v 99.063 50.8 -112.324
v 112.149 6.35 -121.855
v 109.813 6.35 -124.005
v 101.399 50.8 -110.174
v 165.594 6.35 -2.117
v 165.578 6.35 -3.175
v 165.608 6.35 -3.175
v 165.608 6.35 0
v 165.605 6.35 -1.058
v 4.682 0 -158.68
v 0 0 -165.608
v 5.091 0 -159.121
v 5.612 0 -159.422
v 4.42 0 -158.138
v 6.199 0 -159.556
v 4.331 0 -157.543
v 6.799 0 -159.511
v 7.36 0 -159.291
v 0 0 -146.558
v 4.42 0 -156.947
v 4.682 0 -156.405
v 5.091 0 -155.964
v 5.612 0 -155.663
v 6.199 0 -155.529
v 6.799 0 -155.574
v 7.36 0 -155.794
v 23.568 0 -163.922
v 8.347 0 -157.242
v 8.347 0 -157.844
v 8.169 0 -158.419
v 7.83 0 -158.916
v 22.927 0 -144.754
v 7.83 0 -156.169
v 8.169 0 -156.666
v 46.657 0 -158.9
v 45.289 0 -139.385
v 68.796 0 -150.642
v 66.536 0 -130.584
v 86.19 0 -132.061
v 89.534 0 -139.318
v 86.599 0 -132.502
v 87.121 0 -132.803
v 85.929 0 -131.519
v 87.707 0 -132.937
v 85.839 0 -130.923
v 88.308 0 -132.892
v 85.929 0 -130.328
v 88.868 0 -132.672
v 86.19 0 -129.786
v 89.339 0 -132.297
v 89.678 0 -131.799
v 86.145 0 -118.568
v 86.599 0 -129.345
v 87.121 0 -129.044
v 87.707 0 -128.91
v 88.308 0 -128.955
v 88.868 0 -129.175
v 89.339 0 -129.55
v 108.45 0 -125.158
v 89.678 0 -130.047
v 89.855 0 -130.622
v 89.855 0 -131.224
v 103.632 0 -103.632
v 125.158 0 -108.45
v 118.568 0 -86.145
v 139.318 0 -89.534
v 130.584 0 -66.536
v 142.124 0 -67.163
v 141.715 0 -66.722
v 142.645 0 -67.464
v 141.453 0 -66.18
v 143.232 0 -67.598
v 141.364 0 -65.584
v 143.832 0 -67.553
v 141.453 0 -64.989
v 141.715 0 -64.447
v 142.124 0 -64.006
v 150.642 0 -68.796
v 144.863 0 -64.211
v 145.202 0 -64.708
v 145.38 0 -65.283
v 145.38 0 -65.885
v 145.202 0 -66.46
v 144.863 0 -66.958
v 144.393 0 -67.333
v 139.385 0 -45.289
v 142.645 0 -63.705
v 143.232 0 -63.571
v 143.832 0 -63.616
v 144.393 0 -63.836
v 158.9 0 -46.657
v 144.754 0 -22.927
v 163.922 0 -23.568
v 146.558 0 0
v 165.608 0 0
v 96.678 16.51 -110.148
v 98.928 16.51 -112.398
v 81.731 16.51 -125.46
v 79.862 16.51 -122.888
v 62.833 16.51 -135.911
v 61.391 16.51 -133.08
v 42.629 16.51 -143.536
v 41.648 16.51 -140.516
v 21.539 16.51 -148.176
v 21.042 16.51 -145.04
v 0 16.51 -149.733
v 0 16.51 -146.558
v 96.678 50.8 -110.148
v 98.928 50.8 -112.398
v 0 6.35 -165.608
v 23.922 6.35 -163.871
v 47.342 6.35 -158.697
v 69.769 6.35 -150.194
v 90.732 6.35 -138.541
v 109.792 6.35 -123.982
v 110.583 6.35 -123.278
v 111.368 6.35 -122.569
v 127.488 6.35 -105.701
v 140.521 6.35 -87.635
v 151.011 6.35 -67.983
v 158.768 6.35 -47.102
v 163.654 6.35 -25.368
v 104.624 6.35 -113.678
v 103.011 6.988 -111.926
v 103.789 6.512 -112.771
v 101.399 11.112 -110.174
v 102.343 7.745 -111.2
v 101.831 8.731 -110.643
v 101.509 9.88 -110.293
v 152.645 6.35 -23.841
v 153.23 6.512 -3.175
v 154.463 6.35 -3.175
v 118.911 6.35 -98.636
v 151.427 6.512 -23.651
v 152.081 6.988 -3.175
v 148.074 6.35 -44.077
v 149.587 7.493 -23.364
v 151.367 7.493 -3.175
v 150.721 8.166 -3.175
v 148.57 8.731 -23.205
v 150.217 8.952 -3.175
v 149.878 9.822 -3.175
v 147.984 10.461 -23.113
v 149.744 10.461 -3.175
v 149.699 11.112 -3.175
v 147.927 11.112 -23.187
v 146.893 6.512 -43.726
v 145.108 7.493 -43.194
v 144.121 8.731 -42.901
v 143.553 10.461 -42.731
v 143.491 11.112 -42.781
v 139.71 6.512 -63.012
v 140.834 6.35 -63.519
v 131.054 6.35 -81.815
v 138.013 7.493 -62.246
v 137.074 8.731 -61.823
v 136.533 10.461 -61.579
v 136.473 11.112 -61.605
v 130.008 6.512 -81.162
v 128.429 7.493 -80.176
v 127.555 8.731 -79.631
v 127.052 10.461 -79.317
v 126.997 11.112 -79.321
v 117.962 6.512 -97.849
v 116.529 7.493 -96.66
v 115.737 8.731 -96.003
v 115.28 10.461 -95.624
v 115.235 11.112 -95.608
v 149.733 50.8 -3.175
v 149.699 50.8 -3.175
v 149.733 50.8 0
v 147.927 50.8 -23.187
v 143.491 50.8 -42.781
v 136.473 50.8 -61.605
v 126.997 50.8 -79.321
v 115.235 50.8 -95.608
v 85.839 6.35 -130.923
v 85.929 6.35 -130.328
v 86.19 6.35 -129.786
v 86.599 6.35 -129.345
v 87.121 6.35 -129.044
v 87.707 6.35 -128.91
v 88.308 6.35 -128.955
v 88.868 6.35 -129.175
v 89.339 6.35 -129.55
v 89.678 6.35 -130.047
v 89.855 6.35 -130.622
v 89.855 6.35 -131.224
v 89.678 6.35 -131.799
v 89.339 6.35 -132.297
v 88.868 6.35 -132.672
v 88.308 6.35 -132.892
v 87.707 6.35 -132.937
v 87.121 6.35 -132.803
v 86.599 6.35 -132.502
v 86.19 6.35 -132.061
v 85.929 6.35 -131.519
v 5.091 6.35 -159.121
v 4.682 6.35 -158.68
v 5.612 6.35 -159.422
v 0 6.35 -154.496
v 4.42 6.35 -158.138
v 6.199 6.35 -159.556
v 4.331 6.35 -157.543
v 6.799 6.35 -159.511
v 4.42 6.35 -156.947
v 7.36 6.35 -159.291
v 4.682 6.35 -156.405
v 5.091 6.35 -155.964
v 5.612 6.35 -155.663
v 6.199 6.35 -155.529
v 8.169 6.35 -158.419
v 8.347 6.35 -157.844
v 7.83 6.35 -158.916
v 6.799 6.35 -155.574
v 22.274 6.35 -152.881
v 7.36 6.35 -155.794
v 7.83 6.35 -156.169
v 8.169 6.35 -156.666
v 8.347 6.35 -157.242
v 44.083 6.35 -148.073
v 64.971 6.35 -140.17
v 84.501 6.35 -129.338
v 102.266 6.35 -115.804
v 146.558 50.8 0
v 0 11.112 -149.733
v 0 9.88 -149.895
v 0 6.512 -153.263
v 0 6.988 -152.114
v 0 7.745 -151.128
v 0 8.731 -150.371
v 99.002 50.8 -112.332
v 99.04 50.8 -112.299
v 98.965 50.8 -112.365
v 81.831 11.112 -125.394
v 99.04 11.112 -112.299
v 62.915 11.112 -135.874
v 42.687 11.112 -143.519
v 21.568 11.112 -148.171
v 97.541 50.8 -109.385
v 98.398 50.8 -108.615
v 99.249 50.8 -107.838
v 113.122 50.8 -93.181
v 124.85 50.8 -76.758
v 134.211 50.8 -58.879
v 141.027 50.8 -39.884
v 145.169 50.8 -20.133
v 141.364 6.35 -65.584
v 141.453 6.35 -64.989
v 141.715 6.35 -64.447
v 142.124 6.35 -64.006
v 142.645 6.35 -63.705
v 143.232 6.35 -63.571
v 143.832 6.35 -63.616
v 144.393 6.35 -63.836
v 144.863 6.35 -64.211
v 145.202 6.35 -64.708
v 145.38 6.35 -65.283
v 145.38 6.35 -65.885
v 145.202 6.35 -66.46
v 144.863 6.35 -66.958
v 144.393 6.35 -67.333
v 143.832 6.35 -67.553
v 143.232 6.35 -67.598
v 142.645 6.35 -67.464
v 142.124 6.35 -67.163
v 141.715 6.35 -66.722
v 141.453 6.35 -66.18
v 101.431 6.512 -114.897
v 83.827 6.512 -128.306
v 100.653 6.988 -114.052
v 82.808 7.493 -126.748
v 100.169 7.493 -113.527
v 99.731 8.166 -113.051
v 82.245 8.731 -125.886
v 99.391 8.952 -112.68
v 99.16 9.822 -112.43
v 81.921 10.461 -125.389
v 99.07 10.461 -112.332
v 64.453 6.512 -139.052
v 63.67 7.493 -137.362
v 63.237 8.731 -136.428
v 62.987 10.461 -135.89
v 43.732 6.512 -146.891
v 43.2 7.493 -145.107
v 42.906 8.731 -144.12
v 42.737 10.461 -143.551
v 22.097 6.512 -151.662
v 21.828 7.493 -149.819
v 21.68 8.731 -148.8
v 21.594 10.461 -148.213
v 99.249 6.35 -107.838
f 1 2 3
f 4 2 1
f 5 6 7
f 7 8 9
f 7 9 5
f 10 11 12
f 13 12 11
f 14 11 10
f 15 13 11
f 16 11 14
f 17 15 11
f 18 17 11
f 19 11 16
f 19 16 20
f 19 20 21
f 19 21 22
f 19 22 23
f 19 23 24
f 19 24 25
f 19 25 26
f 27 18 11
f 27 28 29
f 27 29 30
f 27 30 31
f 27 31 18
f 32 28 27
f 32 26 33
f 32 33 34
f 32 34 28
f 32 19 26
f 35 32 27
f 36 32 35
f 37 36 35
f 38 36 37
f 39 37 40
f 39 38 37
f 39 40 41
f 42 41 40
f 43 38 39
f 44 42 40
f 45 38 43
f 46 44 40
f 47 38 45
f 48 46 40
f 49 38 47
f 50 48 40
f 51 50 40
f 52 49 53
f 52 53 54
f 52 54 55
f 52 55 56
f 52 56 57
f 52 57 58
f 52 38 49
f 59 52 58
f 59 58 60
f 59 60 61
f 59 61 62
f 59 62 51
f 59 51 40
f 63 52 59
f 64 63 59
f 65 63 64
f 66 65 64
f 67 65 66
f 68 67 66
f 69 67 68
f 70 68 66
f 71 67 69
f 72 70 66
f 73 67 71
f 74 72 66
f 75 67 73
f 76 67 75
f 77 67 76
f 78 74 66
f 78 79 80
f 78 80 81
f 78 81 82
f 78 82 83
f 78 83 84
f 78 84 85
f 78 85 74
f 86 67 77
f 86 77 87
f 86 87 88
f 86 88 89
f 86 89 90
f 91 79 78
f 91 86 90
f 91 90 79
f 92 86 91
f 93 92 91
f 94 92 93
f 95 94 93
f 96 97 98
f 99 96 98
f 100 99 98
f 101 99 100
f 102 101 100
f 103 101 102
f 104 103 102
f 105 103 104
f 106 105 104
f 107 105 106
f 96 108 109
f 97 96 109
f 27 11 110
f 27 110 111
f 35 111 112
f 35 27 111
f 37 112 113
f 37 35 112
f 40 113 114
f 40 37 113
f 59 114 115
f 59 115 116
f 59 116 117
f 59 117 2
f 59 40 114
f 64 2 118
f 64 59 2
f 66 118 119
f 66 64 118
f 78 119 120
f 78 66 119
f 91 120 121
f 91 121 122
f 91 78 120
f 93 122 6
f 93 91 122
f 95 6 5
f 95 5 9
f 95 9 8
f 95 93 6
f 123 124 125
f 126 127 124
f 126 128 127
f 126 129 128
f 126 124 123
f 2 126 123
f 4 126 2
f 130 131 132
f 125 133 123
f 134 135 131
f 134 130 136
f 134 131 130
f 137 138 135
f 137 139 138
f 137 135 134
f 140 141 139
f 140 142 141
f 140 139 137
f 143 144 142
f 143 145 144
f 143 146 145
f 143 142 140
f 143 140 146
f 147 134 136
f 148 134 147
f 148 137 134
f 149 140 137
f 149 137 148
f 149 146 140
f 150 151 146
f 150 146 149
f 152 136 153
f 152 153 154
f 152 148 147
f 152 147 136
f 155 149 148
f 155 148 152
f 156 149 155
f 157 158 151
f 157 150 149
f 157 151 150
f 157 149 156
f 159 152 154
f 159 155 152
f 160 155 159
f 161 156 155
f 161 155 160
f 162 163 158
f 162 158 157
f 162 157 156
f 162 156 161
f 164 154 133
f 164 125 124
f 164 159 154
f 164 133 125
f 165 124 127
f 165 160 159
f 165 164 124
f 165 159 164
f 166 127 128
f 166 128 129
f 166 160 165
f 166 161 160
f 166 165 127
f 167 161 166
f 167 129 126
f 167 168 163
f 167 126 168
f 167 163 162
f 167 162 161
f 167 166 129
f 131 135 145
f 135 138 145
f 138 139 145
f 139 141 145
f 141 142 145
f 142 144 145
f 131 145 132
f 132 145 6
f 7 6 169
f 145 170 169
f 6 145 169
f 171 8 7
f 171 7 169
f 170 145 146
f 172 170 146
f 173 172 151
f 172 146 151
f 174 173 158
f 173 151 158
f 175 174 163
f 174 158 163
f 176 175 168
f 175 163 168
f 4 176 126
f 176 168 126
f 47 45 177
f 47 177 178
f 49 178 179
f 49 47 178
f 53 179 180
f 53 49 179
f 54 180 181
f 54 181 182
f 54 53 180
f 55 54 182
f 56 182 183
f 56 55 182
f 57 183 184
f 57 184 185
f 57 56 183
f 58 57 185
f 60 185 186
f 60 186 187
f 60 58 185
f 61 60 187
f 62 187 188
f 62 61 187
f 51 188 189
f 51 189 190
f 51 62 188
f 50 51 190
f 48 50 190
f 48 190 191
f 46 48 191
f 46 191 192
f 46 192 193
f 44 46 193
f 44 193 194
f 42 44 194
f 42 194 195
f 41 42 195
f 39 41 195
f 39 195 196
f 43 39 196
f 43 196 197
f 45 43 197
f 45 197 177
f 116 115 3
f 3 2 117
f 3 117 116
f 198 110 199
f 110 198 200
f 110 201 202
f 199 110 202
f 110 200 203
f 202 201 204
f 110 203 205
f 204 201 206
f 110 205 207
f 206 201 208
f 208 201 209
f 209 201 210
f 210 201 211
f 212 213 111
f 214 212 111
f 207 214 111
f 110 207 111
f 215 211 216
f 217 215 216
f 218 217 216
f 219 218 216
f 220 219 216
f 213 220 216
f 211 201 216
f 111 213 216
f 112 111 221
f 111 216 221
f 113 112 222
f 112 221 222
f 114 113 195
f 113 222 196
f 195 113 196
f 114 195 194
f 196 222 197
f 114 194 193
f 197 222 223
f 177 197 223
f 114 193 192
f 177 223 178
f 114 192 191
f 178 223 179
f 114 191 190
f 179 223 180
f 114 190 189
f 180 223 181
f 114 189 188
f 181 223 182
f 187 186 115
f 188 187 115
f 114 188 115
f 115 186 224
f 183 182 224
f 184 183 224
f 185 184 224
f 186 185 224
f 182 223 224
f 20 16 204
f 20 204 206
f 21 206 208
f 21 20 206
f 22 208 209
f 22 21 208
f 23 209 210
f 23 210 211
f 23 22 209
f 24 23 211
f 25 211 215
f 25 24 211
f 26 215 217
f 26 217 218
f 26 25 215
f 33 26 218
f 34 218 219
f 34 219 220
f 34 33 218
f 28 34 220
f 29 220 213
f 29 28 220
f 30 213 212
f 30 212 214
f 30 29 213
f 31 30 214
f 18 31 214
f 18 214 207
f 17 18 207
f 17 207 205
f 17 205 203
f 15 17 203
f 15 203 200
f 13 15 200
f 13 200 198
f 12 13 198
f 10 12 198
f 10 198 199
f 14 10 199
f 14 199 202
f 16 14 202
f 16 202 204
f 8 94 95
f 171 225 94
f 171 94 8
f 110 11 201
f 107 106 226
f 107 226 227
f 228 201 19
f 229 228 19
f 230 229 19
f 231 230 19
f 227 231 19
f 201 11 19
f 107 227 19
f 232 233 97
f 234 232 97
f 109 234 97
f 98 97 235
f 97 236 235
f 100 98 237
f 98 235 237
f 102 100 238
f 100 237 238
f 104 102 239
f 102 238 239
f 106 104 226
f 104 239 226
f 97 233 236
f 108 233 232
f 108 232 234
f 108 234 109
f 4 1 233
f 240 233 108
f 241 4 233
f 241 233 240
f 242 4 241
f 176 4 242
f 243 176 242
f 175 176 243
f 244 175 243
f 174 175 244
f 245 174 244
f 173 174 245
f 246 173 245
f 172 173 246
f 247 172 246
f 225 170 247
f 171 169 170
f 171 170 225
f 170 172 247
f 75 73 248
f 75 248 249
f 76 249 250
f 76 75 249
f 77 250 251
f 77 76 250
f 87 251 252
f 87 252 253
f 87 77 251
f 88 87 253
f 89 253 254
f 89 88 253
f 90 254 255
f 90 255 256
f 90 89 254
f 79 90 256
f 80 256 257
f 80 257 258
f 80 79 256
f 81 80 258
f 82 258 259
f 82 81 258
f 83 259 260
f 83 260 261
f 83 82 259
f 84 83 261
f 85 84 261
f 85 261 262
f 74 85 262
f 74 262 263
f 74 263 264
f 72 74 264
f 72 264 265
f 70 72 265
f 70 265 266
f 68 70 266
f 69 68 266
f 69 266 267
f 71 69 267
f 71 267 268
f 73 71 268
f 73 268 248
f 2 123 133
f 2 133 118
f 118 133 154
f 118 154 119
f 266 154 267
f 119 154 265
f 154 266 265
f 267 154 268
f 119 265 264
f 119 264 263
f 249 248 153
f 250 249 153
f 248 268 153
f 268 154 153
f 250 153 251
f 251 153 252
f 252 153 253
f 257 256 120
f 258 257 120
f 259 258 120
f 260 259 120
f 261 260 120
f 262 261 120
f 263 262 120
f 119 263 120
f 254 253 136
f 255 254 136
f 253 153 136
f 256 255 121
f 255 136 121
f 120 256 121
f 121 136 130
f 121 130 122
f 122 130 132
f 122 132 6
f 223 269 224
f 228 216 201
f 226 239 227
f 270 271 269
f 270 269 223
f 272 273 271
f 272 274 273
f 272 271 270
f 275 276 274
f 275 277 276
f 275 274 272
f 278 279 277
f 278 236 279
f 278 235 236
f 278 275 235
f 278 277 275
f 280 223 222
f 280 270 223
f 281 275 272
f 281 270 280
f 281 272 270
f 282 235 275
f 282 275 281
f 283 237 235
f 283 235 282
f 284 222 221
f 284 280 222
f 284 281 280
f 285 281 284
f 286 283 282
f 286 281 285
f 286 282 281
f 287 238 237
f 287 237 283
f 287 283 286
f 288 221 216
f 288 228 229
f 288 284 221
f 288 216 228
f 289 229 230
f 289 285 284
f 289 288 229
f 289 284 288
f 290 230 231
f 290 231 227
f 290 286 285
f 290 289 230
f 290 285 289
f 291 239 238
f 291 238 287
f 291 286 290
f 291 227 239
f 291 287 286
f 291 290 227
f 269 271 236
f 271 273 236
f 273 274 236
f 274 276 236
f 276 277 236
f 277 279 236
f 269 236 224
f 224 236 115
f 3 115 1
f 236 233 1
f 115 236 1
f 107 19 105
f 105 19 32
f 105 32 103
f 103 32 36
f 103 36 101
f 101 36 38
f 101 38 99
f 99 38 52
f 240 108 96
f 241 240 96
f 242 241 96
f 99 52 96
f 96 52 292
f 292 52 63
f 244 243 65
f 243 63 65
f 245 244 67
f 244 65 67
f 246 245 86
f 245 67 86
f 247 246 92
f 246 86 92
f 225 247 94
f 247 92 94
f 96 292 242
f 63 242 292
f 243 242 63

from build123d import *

# Parameters (mm, degrees)
BOSS_EXTRUDE1_DEPTH        = 6.35
BOSS_EXTRUDE2_DEPTH        = 44.45
CUT_EXTRUDE1_DEPTH         = 34.29
F_10_32_TAPPED_HOLE1_D     = 4.0386
F_10_32_TAPPED_HOLE1_DEPTH = 6.35
BOSS_EXTRUDE3_DEPTH        = 3.175
CIRPATTERN1_COUNT          = 2
CIRPATTERN1_ANGLE          = 47.375
FILLET1_R                  = 4.7625


with BuildPart() as part:
    # Sketch1 → Boss-Extrude1 (new body)
    with BuildSketch(Plane(origin=(0, 0, 0), x_dir=(1, 0, 0), z_dir=(0, 1, 0))):
        with BuildLine():
            Line((165.608, 0), (146.558, 0))
            ThreePointArc((146.558, 0), (103.632155637, -103.632155637), (0, -146.558))
            Line((0, -146.558), (0, -165.608))
            ThreePointArc((0, -165.608), (117.102539819, -117.102539819), (165.608, 0))
        make_face()
    extrude(amount=BOSS_EXTRUDE1_DEPTH)

    # Sketch2 → Boss-Extrude2 (add)
    with BuildSketch(Plane(origin=(0, 6.35, 0), x_dir=(1, 0, 0), z_dir=(0, 1, 0))):
        with BuildLine():
            Line((146.558, 0), (149.733, 0))
            ThreePointArc((149.733, 0), (105.877219667, -105.877219667), (0, -149.733))
            Line((0, -149.733), (0, -146.558))
            ThreePointArc((0, -146.558), (103.632155637, -103.632155637), (146.558, 0))
        make_face()
    extrude(amount=BOSS_EXTRUDE2_DEPTH)

    # Sketch3 → Cut-Extrude1 (cut)
    with BuildSketch(Plane(origin=(0, 50.8, 0), x_dir=(1, 0, 0), z_dir=(0, 1, 0))):
        with BuildLine():
            Line((96.677867382, -110.148251563), (98.927586748, -112.39797093))
            ThreePointArc((98.927586748, -112.39797093), (52.869111529, -140.088644562), (0, -149.733))
            Line((0, -149.733), (0, -146.558))
            ThreePointArc((0, -146.558), (51.65336345, -137.153845766), (96.677867382, -110.148251563))
        make_face()
    extrude(amount=-CUT_EXTRUDE1_DEPTH, mode=Mode.SUBTRACT)

    # #10-32 Tapped Hole1
    with Locations(Plane(origin=(0, 6.35, 0), x_dir=(1, 0, 0), z_dir=(0, 1, 0))):
        with Locations((6.35, -157.542578595), (87.858258413, -130.923309609), (143.383000088, -65.58431105)):
            Hole(F_10_32_TAPPED_HOLE1_D / 2, depth=F_10_32_TAPPED_HOLE1_DEPTH)

    # Sketch9 → Boss-Extrude3 (add)
    with BuildSketch(Plane(origin=(0, 0, 0), x_dir=(-1, 0, 0), z_dir=(0, 0, -1))):
        Polygon((-165.608, 6.35), (-149.733, 50.8), (-146.558, 50.8), (-146.558, 6.35), align=None)
    boss_extrude3 = extrude(amount=-BOSS_EXTRUDE3_DEPTH)

    # CirPattern1: Boss-Extrude3 ×2 about axis
    cirpattern1_axis = Axis((0, 0, 0), (0, -1, 0))
    for i in range(1, CIRPATTERN1_COUNT):
        add(boss_extrude3.rotate(cirpattern1_axis, i * CIRPATTERN1_ANGLE / (CIRPATTERN1_COUNT - 1)))

    # Fillet1
    fillet1_edges = [part.edges().sort_by_distance(p)[0] for p in [
        (52.939054251, 6.35, 140.062228399),
        (136.472515739, 6.35, 61.605387238),
    ]]
    fillet(fillet1_edges, radius=FILLET1_R)


with BuildPart() as body_2:
    # Mirror1: mirrored copy
    add(part.part.mirror(Plane.XY))


solid = body_2.part
